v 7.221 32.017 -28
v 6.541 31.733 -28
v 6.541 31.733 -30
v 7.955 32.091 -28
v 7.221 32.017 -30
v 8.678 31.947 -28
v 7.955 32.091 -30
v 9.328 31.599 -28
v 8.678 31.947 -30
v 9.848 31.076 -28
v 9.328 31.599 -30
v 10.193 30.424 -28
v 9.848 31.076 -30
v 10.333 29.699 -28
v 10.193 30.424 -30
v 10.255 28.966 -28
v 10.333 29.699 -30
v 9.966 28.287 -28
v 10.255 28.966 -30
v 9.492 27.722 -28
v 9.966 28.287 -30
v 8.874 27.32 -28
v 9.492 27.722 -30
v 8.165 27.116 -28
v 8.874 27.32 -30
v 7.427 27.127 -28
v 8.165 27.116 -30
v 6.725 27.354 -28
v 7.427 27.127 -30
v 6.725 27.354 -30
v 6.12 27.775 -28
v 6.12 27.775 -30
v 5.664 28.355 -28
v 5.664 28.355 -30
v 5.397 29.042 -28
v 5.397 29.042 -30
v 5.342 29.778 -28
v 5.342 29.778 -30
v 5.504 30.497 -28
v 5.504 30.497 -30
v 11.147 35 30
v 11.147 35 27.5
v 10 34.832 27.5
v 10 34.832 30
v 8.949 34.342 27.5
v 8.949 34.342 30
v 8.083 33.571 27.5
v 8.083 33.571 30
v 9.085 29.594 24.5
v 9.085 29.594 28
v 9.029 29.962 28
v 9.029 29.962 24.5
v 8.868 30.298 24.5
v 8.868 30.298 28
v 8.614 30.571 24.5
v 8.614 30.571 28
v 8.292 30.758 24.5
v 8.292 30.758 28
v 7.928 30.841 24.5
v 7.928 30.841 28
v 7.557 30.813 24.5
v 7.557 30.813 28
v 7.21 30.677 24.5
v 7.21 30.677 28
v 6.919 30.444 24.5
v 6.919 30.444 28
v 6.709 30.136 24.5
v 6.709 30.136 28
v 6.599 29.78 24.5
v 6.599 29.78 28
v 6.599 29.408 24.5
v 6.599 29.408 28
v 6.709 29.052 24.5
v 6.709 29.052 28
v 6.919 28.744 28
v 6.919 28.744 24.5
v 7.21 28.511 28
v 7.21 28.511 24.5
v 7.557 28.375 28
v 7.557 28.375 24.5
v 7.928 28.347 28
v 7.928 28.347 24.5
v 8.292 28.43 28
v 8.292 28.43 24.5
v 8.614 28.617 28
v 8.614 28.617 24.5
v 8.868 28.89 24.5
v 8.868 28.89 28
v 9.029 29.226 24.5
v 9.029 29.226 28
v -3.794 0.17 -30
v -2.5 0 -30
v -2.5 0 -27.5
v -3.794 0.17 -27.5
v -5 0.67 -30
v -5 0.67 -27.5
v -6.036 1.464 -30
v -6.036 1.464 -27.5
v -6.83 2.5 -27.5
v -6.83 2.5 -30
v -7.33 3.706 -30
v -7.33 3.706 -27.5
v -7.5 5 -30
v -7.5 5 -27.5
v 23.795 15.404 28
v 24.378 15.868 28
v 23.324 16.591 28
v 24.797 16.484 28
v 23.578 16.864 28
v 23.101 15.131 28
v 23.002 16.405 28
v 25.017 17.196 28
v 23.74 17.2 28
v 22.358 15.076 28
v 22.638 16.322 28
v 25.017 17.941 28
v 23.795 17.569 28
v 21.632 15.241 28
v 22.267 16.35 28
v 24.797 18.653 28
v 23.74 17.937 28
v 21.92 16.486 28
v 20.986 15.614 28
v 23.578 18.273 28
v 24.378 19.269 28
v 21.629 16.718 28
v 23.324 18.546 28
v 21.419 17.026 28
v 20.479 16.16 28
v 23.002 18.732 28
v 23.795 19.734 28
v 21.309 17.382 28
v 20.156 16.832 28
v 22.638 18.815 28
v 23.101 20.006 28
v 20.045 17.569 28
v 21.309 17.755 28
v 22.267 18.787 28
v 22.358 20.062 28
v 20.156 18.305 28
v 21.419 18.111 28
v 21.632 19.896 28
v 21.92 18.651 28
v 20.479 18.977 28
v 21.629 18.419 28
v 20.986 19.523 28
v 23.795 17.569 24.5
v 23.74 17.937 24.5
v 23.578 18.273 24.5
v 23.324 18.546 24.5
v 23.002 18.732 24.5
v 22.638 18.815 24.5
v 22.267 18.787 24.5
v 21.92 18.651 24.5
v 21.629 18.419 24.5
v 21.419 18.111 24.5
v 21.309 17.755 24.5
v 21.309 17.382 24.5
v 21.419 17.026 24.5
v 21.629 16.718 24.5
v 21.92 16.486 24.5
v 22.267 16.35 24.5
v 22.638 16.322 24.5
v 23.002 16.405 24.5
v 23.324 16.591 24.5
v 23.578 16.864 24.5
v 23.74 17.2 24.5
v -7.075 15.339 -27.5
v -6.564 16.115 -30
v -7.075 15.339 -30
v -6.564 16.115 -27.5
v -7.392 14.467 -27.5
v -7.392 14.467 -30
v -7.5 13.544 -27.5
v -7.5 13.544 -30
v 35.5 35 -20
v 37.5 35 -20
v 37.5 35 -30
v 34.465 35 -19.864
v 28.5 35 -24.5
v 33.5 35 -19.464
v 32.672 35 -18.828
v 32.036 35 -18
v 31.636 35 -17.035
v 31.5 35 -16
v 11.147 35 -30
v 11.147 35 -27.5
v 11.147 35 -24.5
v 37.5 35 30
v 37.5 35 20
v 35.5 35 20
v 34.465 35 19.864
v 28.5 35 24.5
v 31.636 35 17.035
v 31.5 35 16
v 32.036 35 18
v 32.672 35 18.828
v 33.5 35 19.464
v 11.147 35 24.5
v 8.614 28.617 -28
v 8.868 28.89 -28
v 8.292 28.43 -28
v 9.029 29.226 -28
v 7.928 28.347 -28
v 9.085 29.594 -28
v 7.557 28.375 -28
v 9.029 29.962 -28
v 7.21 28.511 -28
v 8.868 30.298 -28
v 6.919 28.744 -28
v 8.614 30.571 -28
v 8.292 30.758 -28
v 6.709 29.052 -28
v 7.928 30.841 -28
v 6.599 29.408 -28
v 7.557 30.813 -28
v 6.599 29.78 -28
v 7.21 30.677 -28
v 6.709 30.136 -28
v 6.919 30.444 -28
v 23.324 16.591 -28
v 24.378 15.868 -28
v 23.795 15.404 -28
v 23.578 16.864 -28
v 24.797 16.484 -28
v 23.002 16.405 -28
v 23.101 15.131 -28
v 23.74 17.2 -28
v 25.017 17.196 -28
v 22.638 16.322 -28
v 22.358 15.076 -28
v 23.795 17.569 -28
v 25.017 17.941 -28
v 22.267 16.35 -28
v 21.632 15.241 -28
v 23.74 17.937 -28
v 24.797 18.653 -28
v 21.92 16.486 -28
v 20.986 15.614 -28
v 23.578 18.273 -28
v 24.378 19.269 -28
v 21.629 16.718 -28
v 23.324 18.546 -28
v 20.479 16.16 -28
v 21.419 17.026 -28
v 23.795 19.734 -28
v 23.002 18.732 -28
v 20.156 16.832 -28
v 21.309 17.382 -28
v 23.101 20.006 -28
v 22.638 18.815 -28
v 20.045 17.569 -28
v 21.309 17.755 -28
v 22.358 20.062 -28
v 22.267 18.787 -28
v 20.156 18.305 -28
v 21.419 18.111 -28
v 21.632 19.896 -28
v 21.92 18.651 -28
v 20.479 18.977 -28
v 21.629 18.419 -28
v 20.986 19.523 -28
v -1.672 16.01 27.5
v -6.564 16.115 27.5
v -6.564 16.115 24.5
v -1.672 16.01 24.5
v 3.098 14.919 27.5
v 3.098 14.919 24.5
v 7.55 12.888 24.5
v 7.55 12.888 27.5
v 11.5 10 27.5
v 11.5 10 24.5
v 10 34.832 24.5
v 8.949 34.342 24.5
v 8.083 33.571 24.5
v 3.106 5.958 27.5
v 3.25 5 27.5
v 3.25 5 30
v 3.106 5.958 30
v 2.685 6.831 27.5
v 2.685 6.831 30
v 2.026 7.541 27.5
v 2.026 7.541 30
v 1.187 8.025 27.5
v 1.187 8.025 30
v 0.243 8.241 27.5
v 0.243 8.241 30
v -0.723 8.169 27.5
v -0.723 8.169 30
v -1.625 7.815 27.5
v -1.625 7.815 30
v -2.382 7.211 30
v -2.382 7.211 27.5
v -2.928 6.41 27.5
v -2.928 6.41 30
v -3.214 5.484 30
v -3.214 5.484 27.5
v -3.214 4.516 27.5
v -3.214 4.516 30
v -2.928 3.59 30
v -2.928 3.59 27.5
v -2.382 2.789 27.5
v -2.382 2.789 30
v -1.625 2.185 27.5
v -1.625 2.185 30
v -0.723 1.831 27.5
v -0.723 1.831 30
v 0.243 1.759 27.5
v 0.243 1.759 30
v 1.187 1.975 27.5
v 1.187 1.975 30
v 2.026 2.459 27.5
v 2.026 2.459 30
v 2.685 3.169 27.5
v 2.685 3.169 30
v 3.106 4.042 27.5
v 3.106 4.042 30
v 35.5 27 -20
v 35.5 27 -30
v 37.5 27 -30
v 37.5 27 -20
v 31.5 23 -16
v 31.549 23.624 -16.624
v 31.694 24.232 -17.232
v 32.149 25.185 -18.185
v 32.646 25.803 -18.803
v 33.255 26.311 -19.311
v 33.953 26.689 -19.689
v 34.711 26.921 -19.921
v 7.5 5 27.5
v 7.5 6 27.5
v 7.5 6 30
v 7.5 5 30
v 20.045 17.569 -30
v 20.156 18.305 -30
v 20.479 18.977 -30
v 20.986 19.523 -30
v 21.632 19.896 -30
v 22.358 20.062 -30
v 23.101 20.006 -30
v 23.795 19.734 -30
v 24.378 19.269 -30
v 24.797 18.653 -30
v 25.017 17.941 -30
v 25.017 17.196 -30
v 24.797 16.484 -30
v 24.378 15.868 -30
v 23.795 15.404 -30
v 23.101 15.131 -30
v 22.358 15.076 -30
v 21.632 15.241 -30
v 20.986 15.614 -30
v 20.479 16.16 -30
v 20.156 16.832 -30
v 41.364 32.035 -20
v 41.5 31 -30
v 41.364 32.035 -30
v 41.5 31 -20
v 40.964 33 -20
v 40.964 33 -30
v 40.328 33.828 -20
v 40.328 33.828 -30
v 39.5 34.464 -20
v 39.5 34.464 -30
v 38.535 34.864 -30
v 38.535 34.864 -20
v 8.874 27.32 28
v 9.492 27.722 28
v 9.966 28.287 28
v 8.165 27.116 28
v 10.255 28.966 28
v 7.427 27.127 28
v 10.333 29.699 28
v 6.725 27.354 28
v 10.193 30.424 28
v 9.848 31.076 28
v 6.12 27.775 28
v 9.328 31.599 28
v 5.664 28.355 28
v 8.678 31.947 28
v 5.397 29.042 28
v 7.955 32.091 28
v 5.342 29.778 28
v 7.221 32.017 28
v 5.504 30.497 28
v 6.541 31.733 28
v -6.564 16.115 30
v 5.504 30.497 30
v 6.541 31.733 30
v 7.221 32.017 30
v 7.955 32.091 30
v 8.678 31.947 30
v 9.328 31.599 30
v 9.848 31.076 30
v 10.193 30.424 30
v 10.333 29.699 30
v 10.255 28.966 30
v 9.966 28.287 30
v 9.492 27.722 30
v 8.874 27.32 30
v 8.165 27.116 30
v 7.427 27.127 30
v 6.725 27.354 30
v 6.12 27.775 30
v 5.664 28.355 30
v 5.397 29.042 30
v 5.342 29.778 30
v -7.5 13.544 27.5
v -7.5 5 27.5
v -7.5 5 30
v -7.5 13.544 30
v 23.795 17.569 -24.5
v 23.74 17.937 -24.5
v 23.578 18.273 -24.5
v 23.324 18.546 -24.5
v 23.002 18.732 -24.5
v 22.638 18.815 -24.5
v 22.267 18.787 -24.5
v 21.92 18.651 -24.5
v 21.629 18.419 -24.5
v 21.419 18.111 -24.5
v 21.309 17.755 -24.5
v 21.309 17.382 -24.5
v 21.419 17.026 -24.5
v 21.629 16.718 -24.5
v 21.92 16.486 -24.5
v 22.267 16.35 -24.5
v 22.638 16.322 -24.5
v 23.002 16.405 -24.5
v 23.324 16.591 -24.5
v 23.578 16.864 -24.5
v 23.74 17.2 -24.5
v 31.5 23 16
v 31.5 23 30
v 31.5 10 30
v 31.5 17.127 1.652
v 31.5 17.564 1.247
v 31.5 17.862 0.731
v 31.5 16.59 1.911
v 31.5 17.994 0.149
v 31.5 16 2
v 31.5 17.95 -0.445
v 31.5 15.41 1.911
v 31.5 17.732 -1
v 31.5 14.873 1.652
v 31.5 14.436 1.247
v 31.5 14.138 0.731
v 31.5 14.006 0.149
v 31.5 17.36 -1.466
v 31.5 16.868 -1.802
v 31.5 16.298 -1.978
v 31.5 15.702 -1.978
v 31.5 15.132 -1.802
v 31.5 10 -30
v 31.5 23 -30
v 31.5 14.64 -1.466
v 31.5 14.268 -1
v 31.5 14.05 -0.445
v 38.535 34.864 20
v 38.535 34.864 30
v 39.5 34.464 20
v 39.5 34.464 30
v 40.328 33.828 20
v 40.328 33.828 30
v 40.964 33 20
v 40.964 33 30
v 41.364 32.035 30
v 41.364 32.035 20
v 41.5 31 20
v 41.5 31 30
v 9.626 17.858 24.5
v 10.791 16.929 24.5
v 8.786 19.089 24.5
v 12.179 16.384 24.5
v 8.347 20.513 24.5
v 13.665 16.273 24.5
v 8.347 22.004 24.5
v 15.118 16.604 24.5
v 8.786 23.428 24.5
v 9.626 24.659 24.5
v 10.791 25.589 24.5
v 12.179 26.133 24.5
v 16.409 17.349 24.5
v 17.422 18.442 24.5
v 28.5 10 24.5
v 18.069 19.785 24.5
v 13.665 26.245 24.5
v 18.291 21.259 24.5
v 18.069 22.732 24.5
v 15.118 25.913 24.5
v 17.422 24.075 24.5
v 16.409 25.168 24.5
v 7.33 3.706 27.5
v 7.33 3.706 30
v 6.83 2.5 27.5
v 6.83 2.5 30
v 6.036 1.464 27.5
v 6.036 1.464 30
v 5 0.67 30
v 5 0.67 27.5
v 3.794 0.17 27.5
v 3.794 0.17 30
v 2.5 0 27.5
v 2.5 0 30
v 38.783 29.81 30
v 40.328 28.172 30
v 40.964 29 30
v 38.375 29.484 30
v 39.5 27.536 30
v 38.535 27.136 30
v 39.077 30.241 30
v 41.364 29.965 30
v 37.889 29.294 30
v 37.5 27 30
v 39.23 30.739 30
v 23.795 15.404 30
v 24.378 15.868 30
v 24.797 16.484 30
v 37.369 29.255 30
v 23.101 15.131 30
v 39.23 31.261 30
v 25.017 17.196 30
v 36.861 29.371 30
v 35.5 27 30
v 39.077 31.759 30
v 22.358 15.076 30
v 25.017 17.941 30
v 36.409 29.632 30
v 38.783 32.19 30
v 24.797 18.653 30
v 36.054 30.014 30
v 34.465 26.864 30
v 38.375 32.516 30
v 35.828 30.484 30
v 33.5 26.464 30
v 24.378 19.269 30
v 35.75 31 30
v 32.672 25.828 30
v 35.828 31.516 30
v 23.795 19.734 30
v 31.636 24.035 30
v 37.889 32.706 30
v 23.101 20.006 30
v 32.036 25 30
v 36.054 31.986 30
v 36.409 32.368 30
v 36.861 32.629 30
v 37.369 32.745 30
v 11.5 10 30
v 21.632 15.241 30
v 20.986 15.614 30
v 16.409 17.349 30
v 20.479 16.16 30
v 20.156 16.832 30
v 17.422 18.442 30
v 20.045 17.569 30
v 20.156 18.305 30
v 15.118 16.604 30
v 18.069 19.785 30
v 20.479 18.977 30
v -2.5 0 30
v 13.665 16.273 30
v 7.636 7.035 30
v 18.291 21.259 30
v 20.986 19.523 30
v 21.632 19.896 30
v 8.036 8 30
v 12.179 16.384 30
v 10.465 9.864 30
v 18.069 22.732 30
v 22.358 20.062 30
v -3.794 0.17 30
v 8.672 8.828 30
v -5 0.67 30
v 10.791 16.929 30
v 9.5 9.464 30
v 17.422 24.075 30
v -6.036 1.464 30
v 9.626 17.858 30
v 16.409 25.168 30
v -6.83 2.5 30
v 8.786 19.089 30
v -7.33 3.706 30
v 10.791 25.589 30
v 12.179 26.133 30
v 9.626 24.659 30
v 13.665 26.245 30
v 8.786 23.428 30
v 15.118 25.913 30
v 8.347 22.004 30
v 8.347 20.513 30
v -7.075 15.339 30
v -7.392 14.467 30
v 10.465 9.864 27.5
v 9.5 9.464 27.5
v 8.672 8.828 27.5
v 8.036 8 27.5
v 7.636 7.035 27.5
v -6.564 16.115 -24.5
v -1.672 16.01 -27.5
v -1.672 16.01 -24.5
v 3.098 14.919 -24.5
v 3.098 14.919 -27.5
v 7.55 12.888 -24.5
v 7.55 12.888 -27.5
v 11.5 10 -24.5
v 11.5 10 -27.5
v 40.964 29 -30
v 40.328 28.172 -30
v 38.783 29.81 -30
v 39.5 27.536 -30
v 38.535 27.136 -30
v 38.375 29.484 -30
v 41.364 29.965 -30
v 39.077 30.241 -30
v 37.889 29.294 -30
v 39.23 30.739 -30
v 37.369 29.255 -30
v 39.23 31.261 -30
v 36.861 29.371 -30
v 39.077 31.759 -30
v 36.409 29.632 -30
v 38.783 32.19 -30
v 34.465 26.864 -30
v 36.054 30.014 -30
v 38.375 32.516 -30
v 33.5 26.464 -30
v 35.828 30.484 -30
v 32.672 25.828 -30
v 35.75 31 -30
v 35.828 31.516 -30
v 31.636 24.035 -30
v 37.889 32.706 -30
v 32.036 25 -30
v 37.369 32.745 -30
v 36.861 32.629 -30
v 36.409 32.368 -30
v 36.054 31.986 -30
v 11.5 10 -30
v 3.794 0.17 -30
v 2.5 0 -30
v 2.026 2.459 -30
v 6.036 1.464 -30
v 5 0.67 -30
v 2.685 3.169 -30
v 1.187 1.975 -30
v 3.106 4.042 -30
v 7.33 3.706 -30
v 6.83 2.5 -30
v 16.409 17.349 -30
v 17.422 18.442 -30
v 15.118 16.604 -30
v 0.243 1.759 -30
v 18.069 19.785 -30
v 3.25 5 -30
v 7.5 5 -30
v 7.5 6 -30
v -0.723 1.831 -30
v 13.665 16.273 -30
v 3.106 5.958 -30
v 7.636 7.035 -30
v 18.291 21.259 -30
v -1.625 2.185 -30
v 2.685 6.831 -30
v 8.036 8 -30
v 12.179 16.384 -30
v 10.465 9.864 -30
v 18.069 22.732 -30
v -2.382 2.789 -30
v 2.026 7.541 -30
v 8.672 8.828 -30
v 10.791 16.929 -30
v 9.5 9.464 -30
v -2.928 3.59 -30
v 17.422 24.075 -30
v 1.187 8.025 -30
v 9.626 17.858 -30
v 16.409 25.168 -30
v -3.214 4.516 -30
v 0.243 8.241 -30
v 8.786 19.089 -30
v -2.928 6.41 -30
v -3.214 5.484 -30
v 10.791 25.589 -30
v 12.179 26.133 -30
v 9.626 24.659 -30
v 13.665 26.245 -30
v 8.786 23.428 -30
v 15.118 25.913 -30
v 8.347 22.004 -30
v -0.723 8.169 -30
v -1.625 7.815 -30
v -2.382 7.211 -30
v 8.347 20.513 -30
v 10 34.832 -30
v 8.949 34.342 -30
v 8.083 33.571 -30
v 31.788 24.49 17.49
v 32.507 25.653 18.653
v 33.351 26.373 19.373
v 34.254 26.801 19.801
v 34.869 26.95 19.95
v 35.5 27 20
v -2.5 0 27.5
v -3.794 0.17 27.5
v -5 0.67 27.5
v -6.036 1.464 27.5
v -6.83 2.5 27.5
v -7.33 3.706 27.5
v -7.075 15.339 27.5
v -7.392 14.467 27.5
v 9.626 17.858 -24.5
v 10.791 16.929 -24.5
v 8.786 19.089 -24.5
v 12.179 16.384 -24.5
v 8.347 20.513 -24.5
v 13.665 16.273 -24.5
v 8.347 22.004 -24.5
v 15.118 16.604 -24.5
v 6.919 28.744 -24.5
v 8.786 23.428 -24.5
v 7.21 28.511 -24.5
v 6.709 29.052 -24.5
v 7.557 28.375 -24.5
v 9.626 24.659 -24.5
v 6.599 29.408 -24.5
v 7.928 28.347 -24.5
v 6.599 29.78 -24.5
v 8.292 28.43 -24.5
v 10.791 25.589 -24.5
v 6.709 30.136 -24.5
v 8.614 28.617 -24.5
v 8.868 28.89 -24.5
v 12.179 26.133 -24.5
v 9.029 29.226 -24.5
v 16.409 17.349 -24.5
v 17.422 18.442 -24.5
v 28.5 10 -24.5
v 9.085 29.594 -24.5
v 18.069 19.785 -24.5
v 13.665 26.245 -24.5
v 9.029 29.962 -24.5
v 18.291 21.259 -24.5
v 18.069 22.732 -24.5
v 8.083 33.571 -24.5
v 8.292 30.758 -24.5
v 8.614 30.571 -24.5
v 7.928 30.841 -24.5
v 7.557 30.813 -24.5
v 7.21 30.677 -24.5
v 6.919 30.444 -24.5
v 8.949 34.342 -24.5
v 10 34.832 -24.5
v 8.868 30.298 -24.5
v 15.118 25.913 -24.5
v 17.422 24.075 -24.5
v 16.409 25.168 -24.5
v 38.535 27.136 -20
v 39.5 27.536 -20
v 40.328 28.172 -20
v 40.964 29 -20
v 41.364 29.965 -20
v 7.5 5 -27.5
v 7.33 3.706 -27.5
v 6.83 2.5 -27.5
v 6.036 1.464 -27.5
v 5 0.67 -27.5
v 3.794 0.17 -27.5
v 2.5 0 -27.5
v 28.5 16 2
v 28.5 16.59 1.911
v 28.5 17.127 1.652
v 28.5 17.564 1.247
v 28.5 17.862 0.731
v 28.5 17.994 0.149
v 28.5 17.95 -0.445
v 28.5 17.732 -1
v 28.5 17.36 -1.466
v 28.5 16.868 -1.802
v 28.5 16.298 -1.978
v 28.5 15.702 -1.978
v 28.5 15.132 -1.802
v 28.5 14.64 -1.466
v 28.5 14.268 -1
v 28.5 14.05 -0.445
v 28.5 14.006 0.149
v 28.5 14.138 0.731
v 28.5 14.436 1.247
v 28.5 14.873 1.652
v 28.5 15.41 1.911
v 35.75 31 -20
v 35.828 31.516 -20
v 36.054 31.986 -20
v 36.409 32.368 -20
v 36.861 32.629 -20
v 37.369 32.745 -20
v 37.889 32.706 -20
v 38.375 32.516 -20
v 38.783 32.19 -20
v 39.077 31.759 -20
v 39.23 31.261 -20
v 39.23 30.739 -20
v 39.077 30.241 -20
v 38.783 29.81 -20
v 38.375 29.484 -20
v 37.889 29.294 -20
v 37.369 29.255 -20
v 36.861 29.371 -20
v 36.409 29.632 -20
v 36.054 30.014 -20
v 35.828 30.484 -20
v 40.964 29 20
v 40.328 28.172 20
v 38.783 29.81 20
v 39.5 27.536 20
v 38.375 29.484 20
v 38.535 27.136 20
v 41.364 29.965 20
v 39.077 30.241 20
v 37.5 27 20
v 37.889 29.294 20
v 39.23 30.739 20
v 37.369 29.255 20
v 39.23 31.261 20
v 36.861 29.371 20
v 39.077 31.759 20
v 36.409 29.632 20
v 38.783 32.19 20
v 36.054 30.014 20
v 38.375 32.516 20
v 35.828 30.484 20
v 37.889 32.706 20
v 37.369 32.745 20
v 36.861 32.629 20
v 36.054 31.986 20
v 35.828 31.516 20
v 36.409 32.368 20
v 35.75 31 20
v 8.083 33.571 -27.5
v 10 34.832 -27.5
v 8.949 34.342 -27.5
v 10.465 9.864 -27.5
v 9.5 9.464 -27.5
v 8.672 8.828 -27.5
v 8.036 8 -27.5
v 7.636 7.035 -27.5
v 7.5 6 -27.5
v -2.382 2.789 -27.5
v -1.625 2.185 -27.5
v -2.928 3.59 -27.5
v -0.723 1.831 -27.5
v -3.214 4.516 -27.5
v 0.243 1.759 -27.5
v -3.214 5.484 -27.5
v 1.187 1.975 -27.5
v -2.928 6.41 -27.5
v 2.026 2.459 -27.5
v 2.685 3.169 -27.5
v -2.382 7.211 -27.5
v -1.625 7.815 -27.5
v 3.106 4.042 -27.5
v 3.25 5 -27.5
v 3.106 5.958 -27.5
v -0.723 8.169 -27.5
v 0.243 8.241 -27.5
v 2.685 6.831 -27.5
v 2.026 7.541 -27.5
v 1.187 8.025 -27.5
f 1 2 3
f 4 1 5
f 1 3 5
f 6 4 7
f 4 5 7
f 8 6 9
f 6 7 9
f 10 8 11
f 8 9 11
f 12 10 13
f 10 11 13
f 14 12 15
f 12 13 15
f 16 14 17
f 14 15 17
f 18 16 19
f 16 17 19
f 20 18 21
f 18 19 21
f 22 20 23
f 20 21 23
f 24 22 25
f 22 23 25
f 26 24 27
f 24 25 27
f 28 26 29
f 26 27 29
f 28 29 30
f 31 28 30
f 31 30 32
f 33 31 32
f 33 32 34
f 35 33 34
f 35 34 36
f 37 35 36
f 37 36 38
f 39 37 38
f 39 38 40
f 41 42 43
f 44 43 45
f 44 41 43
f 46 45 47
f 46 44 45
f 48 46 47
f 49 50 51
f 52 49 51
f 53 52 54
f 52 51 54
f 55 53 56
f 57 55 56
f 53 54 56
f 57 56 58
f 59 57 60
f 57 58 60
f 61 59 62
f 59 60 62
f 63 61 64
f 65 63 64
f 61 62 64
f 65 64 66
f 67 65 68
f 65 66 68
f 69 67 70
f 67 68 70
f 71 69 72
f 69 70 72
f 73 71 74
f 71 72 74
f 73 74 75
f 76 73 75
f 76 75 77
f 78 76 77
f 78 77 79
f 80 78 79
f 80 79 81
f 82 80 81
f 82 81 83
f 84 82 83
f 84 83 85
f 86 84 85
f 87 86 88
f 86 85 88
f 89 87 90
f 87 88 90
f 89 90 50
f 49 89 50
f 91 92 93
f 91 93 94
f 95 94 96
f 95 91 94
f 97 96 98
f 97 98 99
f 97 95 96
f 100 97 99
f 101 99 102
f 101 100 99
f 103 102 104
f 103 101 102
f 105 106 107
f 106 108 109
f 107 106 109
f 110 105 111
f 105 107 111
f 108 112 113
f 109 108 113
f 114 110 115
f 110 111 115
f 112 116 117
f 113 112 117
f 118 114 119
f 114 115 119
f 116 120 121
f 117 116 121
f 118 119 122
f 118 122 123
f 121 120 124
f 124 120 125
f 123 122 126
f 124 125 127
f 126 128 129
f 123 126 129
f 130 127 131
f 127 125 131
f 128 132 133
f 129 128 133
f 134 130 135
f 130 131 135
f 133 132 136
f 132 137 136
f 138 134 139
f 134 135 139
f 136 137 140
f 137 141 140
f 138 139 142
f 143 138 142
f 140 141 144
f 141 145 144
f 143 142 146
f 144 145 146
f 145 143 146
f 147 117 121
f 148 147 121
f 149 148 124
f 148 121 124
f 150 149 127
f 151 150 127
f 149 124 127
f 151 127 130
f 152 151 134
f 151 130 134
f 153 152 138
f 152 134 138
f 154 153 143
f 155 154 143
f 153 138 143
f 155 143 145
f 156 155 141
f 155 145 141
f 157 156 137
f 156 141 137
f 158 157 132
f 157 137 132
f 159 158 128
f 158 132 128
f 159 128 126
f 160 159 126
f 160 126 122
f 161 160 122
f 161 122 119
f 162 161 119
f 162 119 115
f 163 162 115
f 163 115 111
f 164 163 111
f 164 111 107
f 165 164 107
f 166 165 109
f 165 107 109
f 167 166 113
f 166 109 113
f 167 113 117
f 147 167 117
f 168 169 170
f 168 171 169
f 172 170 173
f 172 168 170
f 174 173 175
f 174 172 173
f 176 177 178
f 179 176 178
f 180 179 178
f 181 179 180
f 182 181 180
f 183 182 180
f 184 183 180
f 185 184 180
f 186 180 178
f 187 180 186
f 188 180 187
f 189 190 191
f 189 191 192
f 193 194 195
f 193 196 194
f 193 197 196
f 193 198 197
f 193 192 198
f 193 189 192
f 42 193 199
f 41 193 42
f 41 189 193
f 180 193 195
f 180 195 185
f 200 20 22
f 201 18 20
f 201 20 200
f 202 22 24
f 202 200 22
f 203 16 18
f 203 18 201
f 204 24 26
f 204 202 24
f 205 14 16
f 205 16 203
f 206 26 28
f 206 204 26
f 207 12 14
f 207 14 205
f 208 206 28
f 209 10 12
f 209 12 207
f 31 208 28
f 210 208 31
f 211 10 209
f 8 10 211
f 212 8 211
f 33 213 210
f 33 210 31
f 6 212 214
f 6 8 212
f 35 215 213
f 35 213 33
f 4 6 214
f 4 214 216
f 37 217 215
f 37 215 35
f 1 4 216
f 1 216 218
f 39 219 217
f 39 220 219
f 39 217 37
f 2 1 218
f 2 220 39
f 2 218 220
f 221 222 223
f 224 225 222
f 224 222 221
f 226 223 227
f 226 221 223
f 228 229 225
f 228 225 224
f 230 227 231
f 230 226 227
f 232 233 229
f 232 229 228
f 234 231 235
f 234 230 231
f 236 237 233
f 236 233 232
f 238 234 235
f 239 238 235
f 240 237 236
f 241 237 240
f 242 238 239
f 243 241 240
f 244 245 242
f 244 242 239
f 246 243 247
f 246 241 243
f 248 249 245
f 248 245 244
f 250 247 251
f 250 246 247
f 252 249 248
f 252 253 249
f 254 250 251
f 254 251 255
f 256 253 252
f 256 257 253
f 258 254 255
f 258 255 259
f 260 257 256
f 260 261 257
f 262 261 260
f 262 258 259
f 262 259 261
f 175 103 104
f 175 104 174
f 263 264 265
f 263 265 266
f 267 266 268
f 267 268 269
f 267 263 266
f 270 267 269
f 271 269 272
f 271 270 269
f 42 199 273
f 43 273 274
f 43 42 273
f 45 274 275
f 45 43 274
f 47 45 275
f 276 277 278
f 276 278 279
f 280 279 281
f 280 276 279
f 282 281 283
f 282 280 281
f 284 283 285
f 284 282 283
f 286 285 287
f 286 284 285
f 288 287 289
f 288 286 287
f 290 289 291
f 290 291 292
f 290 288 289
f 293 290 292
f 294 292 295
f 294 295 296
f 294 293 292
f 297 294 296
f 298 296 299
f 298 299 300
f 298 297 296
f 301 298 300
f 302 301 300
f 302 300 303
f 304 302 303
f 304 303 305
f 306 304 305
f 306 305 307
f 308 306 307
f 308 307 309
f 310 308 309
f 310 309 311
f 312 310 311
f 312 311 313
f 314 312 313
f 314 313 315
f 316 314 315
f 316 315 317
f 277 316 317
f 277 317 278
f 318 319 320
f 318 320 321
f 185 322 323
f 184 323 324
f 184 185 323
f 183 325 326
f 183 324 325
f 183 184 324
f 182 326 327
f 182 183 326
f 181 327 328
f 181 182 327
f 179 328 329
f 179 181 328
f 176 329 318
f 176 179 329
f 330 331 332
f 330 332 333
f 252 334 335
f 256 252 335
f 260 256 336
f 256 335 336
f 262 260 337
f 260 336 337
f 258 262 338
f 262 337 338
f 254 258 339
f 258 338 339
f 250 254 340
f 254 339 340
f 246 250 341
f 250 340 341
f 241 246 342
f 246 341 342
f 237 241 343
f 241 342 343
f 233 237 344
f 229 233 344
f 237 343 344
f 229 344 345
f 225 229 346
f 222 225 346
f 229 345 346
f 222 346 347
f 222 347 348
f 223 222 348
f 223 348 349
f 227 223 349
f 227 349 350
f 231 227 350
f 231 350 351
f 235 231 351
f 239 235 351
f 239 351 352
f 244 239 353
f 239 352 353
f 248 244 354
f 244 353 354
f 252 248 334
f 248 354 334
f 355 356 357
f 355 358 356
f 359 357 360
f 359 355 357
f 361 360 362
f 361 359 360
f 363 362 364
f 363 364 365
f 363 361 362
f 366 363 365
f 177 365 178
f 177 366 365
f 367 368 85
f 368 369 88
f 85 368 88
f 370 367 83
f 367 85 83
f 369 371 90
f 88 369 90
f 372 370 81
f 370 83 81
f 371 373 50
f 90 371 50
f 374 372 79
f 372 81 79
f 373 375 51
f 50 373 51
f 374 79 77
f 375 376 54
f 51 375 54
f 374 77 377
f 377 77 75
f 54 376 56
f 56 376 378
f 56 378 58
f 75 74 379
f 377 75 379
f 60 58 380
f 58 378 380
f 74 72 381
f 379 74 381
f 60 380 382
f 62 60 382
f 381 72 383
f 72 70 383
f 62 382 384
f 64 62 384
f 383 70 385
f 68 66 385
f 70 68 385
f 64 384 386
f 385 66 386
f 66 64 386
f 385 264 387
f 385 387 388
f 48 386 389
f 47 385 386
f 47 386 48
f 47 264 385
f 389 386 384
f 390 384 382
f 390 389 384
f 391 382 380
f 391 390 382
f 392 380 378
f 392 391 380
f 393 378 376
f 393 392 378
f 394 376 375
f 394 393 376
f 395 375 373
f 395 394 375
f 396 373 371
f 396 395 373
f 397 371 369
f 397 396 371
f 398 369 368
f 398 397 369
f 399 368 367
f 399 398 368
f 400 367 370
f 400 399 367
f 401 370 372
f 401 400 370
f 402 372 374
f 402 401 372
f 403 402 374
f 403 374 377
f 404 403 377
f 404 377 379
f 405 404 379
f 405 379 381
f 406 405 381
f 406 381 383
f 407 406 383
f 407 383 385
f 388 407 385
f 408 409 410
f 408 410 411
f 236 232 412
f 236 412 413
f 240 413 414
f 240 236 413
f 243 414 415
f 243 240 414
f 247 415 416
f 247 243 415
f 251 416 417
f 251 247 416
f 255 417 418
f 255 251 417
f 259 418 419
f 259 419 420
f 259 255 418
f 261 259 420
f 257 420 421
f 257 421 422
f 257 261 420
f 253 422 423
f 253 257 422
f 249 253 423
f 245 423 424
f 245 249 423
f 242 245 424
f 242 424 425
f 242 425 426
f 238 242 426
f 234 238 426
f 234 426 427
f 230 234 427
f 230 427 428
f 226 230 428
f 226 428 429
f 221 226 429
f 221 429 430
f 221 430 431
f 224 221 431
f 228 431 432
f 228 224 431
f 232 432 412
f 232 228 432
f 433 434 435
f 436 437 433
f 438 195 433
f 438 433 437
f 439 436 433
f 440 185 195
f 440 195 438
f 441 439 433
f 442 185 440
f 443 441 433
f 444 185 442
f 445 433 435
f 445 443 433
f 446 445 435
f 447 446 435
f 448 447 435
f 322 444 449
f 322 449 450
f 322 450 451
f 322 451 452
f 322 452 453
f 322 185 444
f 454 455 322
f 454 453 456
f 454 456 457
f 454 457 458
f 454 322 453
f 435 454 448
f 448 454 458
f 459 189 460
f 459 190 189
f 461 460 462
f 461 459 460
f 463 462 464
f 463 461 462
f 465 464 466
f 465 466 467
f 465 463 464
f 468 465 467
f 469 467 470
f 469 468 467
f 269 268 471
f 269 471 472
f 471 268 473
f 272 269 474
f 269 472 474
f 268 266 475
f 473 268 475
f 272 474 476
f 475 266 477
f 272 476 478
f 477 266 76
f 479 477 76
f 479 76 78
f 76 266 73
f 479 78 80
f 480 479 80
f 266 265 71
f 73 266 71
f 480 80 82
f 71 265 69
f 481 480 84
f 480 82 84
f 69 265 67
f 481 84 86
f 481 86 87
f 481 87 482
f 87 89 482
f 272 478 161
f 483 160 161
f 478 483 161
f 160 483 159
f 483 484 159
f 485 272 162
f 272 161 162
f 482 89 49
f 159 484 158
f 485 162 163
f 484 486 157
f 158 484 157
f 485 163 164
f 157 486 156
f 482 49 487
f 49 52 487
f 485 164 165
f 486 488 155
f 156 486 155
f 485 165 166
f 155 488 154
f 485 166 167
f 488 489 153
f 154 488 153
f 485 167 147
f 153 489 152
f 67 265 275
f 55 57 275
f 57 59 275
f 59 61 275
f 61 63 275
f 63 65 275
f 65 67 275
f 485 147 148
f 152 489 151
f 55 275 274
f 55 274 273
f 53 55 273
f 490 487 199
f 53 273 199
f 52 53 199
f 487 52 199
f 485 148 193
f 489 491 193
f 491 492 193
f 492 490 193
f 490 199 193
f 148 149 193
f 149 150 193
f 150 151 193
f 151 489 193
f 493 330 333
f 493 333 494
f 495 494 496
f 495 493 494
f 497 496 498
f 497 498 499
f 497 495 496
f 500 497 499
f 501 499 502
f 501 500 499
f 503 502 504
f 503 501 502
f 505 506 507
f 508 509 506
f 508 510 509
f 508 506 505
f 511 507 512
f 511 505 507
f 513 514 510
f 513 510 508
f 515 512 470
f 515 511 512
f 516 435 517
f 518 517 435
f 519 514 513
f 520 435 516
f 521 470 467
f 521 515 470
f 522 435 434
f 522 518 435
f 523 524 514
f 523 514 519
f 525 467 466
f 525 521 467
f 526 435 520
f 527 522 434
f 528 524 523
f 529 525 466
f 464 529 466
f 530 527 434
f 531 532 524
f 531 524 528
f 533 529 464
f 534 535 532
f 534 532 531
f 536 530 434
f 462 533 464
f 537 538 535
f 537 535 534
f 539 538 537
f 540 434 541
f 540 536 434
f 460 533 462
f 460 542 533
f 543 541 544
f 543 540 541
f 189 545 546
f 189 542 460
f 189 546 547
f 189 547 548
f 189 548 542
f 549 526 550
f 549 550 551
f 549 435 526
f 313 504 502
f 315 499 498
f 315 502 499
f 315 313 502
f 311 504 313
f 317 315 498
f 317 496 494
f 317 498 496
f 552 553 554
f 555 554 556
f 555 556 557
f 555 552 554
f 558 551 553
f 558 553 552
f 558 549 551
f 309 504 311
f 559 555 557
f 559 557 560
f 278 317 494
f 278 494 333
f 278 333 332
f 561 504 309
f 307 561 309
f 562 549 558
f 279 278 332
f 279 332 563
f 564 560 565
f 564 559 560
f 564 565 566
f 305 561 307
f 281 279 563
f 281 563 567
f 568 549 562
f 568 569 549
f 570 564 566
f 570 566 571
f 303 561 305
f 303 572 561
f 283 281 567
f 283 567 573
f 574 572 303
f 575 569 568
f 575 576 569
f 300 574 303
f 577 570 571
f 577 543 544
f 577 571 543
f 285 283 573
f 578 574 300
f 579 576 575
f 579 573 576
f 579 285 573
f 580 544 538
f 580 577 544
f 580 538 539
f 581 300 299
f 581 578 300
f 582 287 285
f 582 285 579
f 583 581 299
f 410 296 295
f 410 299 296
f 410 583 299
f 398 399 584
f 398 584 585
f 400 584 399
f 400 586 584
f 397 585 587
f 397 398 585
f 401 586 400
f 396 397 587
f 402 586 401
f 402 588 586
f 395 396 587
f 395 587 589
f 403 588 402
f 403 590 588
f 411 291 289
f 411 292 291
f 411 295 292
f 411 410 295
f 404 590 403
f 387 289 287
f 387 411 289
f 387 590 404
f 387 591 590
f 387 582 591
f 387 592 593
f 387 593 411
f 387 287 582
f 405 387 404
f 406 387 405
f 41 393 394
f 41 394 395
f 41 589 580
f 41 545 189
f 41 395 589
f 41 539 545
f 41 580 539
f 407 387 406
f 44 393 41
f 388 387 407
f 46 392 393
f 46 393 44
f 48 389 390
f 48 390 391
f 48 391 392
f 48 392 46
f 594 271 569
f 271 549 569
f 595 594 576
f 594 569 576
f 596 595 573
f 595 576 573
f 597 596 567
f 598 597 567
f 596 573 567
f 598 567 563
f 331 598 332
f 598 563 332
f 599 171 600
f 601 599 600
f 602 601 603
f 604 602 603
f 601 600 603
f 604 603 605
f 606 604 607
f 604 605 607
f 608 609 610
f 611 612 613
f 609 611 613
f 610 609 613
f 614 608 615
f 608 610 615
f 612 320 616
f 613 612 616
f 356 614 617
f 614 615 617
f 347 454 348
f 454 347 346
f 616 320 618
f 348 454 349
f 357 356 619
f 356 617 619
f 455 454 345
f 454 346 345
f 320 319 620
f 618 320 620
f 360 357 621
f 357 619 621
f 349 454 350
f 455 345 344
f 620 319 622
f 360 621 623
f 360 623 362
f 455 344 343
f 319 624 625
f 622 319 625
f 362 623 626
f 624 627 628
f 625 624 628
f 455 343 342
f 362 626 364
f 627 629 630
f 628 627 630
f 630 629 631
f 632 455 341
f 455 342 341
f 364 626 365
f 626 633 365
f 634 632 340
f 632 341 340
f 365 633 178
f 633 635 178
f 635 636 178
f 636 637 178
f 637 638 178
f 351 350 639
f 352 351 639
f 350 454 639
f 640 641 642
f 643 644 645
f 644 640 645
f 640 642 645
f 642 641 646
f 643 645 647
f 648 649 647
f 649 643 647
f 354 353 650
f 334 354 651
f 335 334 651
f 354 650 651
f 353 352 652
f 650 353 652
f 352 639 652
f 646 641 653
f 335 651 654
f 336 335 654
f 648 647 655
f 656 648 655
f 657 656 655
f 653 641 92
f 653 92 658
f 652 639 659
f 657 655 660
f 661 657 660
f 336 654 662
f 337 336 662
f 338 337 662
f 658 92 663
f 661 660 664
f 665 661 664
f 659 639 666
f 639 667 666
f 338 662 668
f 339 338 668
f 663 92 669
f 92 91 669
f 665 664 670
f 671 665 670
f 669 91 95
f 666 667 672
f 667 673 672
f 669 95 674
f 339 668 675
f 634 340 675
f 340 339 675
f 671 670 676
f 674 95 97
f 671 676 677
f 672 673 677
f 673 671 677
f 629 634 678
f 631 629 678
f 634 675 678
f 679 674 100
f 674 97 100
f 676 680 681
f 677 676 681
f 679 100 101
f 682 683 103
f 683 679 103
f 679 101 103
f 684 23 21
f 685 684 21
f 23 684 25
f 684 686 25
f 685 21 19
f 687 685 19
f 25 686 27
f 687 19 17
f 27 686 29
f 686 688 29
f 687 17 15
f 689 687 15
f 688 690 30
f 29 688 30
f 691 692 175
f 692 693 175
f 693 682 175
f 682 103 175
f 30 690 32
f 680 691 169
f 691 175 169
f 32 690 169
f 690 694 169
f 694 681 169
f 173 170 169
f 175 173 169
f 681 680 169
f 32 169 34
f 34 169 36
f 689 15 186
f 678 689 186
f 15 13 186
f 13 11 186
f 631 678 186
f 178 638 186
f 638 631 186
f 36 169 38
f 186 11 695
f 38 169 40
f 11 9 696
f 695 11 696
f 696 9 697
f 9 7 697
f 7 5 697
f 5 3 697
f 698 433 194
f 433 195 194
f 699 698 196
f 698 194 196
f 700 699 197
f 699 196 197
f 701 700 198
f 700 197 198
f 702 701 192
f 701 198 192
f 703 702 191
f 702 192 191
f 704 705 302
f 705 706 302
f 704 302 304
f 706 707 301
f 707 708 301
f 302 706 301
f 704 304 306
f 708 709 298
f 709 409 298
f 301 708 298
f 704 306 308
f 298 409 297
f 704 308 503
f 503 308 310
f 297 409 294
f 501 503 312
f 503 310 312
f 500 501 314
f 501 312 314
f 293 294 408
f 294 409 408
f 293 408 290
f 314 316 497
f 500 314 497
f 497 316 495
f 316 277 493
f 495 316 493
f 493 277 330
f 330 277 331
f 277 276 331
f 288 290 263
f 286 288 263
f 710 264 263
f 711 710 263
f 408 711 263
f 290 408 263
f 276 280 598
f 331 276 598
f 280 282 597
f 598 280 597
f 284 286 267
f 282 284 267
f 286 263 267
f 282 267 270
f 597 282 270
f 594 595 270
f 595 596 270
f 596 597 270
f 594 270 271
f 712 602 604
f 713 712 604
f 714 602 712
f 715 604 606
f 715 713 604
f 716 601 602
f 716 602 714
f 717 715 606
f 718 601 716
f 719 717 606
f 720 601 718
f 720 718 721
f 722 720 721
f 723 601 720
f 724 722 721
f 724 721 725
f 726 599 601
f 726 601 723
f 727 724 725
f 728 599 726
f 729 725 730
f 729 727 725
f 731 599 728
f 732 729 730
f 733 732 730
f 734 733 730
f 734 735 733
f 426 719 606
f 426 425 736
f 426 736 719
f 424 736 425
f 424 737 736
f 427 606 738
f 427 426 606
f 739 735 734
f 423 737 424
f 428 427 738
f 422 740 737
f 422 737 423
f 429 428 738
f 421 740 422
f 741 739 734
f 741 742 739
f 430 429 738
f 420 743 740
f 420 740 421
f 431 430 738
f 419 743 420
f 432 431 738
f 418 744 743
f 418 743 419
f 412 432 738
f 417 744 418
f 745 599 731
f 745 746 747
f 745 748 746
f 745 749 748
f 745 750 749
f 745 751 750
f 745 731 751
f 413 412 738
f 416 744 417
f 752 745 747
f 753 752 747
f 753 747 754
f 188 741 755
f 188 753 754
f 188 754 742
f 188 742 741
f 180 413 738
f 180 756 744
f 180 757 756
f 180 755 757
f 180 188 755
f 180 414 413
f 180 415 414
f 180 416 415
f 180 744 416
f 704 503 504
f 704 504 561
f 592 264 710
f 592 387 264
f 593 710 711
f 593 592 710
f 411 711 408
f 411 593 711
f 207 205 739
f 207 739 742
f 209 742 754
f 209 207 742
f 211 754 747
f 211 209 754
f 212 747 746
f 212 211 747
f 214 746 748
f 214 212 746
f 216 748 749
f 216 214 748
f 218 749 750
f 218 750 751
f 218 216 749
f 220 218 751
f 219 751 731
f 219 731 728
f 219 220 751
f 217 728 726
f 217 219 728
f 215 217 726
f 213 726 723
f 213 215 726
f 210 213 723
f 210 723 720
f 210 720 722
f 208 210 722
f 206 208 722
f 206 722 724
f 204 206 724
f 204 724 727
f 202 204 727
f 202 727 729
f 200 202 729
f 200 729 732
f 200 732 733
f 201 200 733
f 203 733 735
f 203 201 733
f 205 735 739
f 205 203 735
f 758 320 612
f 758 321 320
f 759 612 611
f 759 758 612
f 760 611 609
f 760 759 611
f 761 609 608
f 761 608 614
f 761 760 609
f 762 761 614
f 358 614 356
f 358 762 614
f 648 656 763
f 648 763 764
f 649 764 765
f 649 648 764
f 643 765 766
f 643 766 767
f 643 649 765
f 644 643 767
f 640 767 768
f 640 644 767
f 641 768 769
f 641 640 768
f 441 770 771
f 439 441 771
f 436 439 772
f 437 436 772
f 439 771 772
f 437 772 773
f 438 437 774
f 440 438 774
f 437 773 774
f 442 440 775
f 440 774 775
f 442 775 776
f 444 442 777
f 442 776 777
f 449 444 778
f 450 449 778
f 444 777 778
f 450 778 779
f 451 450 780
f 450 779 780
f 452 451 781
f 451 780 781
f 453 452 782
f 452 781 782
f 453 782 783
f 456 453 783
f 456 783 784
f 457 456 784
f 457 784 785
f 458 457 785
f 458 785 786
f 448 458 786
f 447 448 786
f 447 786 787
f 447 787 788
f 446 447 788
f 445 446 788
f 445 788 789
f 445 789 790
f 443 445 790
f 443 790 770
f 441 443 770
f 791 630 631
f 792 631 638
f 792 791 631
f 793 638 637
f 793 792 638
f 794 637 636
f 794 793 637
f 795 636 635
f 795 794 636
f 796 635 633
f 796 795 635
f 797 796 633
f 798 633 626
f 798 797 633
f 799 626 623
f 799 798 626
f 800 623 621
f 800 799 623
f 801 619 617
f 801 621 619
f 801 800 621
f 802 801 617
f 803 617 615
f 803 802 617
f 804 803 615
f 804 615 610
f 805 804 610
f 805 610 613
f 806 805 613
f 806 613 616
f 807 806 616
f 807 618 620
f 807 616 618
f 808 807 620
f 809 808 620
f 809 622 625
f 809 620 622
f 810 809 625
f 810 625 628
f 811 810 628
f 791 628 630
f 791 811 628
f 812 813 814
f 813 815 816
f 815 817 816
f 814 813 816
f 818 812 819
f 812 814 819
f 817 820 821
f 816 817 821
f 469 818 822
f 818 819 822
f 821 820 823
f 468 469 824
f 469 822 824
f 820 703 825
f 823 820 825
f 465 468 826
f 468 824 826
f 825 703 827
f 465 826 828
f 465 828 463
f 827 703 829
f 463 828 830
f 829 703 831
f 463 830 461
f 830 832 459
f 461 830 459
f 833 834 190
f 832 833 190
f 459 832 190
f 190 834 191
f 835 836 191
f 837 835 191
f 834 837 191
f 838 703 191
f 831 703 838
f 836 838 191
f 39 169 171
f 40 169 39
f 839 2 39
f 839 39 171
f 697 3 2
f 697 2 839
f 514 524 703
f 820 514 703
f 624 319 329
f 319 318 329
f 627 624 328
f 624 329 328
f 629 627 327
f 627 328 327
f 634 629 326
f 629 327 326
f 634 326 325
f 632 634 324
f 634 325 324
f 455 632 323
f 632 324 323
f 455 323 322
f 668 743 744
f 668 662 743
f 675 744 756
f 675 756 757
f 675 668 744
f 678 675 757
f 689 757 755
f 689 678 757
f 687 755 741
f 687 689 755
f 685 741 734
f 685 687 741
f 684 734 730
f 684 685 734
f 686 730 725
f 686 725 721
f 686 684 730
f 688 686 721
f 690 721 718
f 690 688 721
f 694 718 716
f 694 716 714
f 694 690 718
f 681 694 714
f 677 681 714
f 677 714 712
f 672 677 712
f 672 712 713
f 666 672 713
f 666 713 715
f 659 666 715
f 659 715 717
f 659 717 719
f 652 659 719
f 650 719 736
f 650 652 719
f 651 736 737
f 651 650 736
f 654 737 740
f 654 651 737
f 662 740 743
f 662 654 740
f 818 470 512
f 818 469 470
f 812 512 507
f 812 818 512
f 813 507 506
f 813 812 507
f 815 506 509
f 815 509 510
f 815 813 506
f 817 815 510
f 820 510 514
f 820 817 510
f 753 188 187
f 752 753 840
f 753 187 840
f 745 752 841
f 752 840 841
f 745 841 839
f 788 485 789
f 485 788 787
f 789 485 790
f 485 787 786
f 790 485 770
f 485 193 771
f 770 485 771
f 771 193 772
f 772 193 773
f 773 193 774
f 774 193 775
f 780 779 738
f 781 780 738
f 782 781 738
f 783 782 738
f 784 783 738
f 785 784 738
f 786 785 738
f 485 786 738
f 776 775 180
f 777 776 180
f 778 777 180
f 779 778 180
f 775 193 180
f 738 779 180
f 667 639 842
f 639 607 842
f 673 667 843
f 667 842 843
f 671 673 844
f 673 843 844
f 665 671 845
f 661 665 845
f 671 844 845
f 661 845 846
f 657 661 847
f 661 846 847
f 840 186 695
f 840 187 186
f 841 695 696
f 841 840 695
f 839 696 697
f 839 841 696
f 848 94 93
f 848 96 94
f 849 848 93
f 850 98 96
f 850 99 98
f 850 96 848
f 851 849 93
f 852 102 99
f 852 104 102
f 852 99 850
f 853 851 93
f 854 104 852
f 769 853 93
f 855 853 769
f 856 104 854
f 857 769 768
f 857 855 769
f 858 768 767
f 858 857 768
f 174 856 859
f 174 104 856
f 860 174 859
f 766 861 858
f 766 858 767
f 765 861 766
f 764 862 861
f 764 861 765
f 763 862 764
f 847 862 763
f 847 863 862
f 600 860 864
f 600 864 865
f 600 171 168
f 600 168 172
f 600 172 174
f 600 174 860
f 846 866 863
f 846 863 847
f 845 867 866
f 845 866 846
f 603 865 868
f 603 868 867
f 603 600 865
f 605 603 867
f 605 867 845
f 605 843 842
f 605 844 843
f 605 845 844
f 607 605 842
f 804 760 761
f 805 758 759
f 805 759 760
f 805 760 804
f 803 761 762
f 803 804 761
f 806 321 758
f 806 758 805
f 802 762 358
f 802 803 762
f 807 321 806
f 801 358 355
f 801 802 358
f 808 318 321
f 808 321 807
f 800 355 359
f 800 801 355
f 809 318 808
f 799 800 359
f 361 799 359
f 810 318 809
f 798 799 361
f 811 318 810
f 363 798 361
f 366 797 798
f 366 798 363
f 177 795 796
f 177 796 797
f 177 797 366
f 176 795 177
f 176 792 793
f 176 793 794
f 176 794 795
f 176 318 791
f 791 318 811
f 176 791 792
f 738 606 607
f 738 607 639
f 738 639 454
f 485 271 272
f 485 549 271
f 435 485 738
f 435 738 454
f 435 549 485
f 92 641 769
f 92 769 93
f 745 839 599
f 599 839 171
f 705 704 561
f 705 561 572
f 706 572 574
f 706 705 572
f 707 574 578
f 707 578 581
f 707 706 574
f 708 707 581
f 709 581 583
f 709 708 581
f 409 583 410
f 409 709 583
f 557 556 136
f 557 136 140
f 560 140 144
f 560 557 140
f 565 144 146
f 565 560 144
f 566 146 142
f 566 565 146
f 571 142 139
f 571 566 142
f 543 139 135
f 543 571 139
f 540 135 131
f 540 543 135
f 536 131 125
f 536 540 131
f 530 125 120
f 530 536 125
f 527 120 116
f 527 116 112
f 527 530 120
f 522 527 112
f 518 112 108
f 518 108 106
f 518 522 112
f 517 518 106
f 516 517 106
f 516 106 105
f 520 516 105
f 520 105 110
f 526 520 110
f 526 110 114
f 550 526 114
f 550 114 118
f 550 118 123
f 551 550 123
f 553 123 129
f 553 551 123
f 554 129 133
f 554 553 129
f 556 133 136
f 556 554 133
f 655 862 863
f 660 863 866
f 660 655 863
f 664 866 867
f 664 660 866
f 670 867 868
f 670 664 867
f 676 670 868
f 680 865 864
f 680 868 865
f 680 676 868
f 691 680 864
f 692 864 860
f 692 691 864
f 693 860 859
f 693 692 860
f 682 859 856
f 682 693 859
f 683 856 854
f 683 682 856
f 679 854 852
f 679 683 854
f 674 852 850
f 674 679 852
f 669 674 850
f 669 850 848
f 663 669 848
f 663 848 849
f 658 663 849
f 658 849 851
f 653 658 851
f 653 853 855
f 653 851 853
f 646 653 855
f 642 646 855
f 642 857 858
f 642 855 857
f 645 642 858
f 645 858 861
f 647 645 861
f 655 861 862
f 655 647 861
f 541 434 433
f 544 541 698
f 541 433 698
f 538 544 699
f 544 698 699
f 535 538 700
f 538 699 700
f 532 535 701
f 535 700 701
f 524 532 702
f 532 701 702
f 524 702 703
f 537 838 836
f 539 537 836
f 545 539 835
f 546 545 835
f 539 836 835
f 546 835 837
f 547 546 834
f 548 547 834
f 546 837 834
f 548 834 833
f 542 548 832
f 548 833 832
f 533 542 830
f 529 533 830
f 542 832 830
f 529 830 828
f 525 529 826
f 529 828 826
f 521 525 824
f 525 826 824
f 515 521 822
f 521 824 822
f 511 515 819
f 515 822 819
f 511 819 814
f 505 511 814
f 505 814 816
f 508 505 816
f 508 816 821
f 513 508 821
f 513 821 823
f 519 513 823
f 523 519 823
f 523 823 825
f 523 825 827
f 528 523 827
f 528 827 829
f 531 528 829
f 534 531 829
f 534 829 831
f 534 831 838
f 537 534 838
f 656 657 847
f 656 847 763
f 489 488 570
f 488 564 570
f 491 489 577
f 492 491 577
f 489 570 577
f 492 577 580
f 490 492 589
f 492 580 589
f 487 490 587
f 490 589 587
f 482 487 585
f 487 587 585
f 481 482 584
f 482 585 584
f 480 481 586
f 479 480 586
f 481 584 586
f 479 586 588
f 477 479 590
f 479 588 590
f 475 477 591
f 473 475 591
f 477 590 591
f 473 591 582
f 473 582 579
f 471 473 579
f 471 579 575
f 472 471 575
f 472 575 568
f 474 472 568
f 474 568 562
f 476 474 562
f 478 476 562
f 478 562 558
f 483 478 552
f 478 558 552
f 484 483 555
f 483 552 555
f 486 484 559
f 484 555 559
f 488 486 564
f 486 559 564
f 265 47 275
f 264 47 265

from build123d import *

# Parameters (mm, degrees)
BOSS_EXTRUDE1_DEPTH      = 30
BOSS_EXTRUDE1_DEPTH_BACK = 30
SKETCH2_R                = 3.25
SKETCH2_R_2              = 1.25
SKETCH2_R_3              = 5
SKETCH3_W                = 72
SKETCH3_H                = 55
CUT_EXTRUDE1_DEPTH       = 56.8323383
SKETCH4_W                = 10
SKETCH4_H                = 8
BOSS_EXTRUDE2_DEPTH      = 10
FILLET1_R                = 4
SKETCH5_R                = 1.75
CUT_EXTRUDE2_DEPTH       = 74.805487601
FILLET1_OF_MIRROR1_R     = 4
FILLET2_R                = 4
SKETCH6_R                = 1.25
SKETCH6_R_2              = 5
BOSS_EXTRUDE3_DEPTH      = 3
SKETCH7_R                = 2.5
CUT_EXTRUDE3_DEPTH       = 2
SKETCH8_R                = 2
CUT_EXTRUDE4_DEPTH       = 59.489315264


with BuildPart() as part:
    # Sketch2 → Boss-Extrude1 (new, two sides: drawn at the far end of the back side and taken through both)
    with BuildSketch(Plane.XY.offset(-BOSS_EXTRUDE1_DEPTH_BACK)):
        with BuildLine():
            Line((-7.5, 5), (-7.5, 15))
            Line((-7.5, 15), (9.281992624, 35))
            Line((9.281992624, 35), (31.5, 35))
            Line((31.5, 35), (31.5, 10))
            Line((31.5, 10), (7.5, 10))
            Line((7.5, 10), (7.5, 5))
            ThreePointArc((7.5, 5), (6.035533906, 1.464466094), (2.5, 0))
            Line((2.5, 0), (-2.5, 0))
            ThreePointArc((-2.5, 0), (-6.035533906, 1.464466094), (-7.5, 5))
        make_face()
        with Locations((0, 5)):
            Circle(SKETCH2_R, mode=Mode.SUBTRACT)
        with Locations((22.545074696, 17.568596061)):
            Circle(SKETCH2_R_2, mode=Mode.SUBTRACT)
        with Locations((7.834882147, 29.593995644)):
            Circle(SKETCH2_R_2, mode=Mode.SUBTRACT)
        with Locations((13.291231119, 21.258633871)):
            Circle(SKETCH2_R_3, mode=Mode.SUBTRACT)
    extrude(amount=BOSS_EXTRUDE1_DEPTH + BOSS_EXTRUDE1_DEPTH_BACK)

    # Sketch3 → Cut-Extrude1 (cut, through all)
    with BuildSketch(Plane(origin=(0, 35, 0), x_dir=(1, 0, 0), z_dir=(0, 1, 0))):
        with Locations((-7.5, 0)):
            Rectangle(SKETCH3_W, SKETCH3_H)
    extrude(amount=-CUT_EXTRUDE1_DEPTH, mode=Mode.SUBTRACT)

    # Sketch4 → Boss-Extrude2 (add)
    with BuildSketch(Plane(origin=(31.5, 0, 0), x_dir=(0, 0, -1), z_dir=(1, 0, 0))):
        with Locations((-25, 31)):
            Rectangle(SKETCH4_W, SKETCH4_H)
    boss_extrude2 = extrude(amount=BOSS_EXTRUDE2_DEPTH)

    # Fillet1
    fillet1_edges = [part.edges().sort_by_distance(p)[0] for p in [
        (41.5, 27, 25),
        (41.5, 35, 25),
    ]]
    fillet(fillet1_edges, radius=FILLET1_R - 0.0001)  # a hair under: the kernel refuses the full size

    # Sketch5 → Cut-Extrude2 (cut, through all)
    with BuildSketch(Plane(origin=(0, 0, 20), x_dir=(-1, 0, 0), z_dir=(0, 0, -1))):
        with Locations((-37.5, 31)):
            Circle(SKETCH5_R)
    cut_extrude2 = extrude(amount=-CUT_EXTRUDE2_DEPTH, mode=Mode.SUBTRACT)

    # Mirror1: Boss-Extrude2, Cut-Extrude2 across plane
    add(boss_extrude2.mirror(Plane.XY))
    add(cut_extrude2.mirror(Plane.XY), mode=Mode.SUBTRACT)

    # Fillet1 of Mirror1
    fillet1_of_mirror1_edges = [part.edges().sort_by_distance(p)[0] for p in [
        (41.5, 27, -25),
        (41.5, 35, -25),
    ]]
    fillet(fillet1_of_mirror1_edges, radius=FILLET1_OF_MIRROR1_R - 0.0001)  # a hair under: the kernel refuses the full size

    # Fillet2
    fillet2_edges = [part.edges().sort_by_distance(p)[0] for p in [
        (31.5, 27, 25),
        (31.5, 31, 20),
        (31.5, 27, -25),
        (31.5, 31, -20),
        (9.281992624, 35, -28.75),
        (7.5, 10, -28.75),
        (-7.5, 15, -28.75),
        (-7.5, 15, 28.75),
        (7.5, 10, 28.75),
        (9.281992624, 35, 28.75),
    ]]
    fillet(fillet2_edges, radius=FILLET2_R)

    # Sketch6 → Boss-Extrude3 (add)
    with BuildSketch(Plane.XY.offset(-27.5)):
        with BuildLine():
            Line((28.5, 35), (11.147223256, 35))
            ThreePointArc((11.147223256, 35), (9.456750209, 34.625231148), (8.083045484, 33.571150439))
            Line((8.083045484, 33.571150439), (-6.564177772, 16.115269502))
            ThreePointArc((-6.564177772, 16.115269502), (3.098200373, 14.919475381), (11.5, 10))
            Line((11.5, 10), (28.5, 10))
            Line((28.5, 10), (28.5, 35))
        make_face()
        with Locations((22.545074696, 17.568596061)):
            Circle(SKETCH6_R, mode=Mode.SUBTRACT)
        with Locations((13.291231119, 21.258633871)):
            Circle(SKETCH6_R_2, mode=Mode.SUBTRACT)
        with Locations((7.834882147, 29.593995644)):
            Circle(SKETCH6_R, mode=Mode.SUBTRACT)
    boss_extrude3 = extrude(amount=BOSS_EXTRUDE3_DEPTH)

    # Sketch7 → Cut-Extrude3 (cut)
    with BuildSketch(Plane(origin=(0, 0, -30), x_dir=(-1, 0, 0), z_dir=(0, 0, -1))):
        with Locations((-22.545074696, 17.568596061)):
            Circle(SKETCH7_R)
        with Locations((-7.834882147, 29.593995644)):
            Circle(SKETCH7_R)
    cut_extrude3 = extrude(amount=-CUT_EXTRUDE3_DEPTH, mode=Mode.SUBTRACT)

    # Mirror2: Boss-Extrude3, Cut-Extrude3 across plane
    add(boss_extrude3.mirror(Plane.XY))
    add(cut_extrude3.mirror(Plane.XY), mode=Mode.SUBTRACT)

    # Sketch8 → Cut-Extrude4 (cut, through all)
    with BuildSketch(Plane.ZY.offset(-28.5)):
        with Locations((0, 16)):
            Circle(SKETCH8_R)
    extrude(amount=-CUT_EXTRUDE4_DEPTH, mode=Mode.SUBTRACT)


solid = part.part
